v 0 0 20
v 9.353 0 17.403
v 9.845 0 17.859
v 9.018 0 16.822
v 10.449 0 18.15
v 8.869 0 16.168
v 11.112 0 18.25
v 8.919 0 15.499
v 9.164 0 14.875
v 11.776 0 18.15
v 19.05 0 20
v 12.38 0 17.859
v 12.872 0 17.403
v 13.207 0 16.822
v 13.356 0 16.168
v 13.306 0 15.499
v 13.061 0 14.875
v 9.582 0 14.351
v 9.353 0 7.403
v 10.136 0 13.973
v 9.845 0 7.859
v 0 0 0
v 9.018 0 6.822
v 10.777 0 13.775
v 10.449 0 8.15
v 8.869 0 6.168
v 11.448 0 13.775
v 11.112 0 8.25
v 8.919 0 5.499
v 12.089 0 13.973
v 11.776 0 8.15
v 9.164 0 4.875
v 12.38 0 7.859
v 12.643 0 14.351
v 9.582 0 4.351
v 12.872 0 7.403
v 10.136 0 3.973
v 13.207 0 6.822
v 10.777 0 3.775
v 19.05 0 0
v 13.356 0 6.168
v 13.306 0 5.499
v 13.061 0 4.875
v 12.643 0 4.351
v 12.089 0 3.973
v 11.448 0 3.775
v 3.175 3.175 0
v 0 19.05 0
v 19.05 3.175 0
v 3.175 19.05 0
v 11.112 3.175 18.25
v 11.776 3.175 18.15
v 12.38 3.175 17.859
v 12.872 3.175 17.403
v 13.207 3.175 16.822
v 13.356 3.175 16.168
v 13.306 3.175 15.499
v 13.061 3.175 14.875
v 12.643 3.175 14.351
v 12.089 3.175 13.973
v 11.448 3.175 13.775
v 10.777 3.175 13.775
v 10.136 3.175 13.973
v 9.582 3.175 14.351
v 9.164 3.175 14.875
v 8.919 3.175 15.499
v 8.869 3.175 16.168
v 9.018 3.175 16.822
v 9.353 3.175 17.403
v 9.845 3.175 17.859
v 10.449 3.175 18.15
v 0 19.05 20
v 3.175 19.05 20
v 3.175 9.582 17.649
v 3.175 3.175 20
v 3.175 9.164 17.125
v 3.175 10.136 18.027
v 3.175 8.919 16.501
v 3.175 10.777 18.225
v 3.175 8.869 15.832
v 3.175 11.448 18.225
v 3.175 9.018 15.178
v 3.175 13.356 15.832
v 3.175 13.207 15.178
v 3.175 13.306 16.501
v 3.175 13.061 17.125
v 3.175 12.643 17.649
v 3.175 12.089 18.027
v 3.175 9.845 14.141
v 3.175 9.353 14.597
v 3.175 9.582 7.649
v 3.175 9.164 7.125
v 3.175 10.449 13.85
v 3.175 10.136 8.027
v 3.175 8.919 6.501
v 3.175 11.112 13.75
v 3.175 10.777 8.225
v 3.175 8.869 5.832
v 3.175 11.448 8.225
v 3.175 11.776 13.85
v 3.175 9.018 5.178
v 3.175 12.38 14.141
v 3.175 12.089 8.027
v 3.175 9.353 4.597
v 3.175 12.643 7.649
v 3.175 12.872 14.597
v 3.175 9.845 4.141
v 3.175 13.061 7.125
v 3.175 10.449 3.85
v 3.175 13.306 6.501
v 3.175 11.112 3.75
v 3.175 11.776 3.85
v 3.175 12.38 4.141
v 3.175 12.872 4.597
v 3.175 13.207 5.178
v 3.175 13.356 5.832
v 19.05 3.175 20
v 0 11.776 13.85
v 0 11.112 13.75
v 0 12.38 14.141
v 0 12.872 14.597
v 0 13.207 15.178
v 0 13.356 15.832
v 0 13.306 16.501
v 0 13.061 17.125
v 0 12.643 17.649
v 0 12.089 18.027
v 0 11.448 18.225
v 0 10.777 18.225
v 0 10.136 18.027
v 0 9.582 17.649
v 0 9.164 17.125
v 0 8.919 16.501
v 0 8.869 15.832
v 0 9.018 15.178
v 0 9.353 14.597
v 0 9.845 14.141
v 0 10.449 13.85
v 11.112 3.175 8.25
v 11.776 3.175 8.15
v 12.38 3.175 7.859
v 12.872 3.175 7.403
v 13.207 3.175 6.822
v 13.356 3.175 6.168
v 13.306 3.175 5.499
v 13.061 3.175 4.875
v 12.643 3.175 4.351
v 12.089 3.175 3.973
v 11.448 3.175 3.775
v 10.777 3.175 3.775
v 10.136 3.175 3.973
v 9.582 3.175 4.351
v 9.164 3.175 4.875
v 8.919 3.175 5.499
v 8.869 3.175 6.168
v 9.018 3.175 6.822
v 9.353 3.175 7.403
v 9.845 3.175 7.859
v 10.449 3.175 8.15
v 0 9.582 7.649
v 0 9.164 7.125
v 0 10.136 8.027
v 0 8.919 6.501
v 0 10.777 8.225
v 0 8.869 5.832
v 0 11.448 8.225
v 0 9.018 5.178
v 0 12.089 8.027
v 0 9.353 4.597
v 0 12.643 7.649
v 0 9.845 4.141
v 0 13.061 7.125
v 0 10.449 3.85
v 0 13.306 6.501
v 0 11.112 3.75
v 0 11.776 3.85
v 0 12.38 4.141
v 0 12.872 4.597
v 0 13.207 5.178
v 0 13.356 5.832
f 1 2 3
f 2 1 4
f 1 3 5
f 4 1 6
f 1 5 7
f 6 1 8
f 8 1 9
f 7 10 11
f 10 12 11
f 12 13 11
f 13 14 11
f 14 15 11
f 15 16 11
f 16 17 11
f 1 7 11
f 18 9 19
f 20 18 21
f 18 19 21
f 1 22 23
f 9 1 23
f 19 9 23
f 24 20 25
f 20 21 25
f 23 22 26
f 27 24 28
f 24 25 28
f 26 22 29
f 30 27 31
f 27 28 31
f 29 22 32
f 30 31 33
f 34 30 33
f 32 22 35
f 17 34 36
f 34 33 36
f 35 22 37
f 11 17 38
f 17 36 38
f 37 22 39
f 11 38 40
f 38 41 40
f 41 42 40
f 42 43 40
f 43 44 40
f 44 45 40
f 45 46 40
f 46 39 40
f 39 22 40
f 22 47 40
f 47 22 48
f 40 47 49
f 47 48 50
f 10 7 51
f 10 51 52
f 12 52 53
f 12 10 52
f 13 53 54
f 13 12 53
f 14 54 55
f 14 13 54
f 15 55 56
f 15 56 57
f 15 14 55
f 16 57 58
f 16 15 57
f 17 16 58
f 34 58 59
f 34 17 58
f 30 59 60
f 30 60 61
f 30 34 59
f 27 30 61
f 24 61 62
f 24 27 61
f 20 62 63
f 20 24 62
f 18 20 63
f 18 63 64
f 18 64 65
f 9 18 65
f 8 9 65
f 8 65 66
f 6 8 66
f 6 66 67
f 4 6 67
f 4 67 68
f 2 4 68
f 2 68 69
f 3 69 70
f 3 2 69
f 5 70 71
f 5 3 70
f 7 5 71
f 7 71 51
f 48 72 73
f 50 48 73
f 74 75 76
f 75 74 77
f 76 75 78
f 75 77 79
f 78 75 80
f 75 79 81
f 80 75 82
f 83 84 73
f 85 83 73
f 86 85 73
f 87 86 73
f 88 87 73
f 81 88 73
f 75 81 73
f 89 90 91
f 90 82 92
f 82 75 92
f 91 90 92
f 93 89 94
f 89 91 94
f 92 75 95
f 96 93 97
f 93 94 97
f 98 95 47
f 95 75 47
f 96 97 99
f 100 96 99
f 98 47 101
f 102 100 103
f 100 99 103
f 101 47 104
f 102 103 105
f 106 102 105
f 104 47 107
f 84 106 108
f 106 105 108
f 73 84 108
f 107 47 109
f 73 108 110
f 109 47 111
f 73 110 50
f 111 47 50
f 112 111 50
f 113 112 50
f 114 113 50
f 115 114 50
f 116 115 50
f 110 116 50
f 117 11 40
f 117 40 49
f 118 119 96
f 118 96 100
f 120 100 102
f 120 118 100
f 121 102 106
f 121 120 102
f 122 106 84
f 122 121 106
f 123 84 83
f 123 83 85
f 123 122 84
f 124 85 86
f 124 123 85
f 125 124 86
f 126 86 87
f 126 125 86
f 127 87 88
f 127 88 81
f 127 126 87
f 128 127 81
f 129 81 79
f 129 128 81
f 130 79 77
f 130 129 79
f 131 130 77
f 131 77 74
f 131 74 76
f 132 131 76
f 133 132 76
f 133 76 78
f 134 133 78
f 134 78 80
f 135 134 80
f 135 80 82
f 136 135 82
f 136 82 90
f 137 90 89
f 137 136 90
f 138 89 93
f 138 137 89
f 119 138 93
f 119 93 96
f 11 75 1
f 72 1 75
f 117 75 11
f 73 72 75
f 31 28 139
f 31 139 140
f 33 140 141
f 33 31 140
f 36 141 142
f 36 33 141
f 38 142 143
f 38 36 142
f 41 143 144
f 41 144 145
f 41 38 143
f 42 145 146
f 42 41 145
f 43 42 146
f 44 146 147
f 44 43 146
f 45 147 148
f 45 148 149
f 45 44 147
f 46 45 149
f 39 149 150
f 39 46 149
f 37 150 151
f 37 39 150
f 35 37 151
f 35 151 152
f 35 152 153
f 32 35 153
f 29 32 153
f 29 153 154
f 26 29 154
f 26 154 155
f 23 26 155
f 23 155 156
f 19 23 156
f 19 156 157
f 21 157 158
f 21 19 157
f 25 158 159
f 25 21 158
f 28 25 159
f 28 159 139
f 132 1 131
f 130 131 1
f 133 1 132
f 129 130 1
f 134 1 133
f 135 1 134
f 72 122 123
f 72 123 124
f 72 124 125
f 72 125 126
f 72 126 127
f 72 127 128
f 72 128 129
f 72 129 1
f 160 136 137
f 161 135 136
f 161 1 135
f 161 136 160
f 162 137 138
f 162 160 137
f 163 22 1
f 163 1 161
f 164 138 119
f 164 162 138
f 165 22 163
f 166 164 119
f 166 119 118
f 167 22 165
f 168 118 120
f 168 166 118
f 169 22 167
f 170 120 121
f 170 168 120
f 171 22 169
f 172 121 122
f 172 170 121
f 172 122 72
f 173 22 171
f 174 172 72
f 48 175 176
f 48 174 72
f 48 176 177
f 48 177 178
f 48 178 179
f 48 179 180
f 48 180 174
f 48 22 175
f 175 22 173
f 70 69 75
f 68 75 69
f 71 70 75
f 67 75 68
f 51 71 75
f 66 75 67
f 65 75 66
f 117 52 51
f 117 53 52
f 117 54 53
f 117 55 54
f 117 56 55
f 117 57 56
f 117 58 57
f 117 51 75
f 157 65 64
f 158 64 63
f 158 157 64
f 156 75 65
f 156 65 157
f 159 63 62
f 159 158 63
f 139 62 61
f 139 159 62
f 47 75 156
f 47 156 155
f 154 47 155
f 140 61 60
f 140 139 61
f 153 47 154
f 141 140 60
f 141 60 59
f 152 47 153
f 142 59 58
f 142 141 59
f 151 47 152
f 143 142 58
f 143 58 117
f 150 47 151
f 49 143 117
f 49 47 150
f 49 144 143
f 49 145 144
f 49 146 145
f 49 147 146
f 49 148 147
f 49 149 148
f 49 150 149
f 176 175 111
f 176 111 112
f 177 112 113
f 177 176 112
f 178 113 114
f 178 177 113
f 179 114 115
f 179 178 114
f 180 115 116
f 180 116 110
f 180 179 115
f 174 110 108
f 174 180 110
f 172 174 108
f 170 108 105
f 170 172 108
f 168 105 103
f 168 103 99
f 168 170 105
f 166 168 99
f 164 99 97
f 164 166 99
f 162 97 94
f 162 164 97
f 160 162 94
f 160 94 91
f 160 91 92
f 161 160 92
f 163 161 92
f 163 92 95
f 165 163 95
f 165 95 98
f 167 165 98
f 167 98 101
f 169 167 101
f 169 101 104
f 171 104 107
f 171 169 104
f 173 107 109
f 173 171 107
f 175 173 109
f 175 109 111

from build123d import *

# Parameters (mm, degrees)
SK_ALA_1_W           = 19.05
SK_ALA_1_H           = 3.175
ALA_1_DEPTH          = 20
SK_ALA_2_W           = 3.175
SK_ALA_2_H           = 19.05
ALA_2_DEPTH          = 20
SK_BARRENOS_ALA_1_R  = 2.25
BARRENOS_ALA_1_DEPTH = 3.175
SK_BARRENOS_ALA_2_R  = 2.25
BARRENOS_ALA_2_DEPTH = 3.175


with BuildPart() as part:
    # Sk_Ala_1 → Ala_1 (new body)
    with BuildSketch(Plane.XY):
        with Locations((9.525, 1.5875)):
            Rectangle(SK_ALA_1_W, SK_ALA_1_H)
    extrude(amount=ALA_1_DEPTH)

    # Sk_Ala_2 → Ala_2 (add)
    with BuildSketch(Plane.XY):
        with Locations((1.5875, 9.525)):
            Rectangle(SK_ALA_2_W, SK_ALA_2_H)
    extrude(amount=ALA_2_DEPTH)

    # Sk_Barrenos_ala_1 → Barrenos_ala_1 (cut)
    with BuildSketch(Plane(origin=(0, 0, 0), x_dir=(1, 0, 0), z_dir=(0, 1, 0))):
        with Locations(Location((11.1125, -6, 0), (0, 0, 270))):
            Circle(SK_BARRENOS_ALA_1_R)
        with Locations(Location((11.1125, -16, 0), (0, 0, 270))):
            Circle(SK_BARRENOS_ALA_1_R)
    extrude(amount=BARRENOS_ALA_1_DEPTH, mode=Mode.SUBTRACT)

    # Sk_Barrenos_ala_2 → Barrenos_ala_2 (cut)
    with BuildSketch(Plane(origin=(0, 0, 0), x_dir=(0, 0, -1), z_dir=(1, 0, 0))):
        with Locations((-6, 11.1125)):
            Circle(SK_BARRENOS_ALA_2_R)
        with Locations((-16, 11.1125)):
            Circle(SK_BARRENOS_ALA_2_R)
    extrude(amount=BARRENOS_ALA_2_DEPTH, mode=Mode.SUBTRACT)


solid = part.part
